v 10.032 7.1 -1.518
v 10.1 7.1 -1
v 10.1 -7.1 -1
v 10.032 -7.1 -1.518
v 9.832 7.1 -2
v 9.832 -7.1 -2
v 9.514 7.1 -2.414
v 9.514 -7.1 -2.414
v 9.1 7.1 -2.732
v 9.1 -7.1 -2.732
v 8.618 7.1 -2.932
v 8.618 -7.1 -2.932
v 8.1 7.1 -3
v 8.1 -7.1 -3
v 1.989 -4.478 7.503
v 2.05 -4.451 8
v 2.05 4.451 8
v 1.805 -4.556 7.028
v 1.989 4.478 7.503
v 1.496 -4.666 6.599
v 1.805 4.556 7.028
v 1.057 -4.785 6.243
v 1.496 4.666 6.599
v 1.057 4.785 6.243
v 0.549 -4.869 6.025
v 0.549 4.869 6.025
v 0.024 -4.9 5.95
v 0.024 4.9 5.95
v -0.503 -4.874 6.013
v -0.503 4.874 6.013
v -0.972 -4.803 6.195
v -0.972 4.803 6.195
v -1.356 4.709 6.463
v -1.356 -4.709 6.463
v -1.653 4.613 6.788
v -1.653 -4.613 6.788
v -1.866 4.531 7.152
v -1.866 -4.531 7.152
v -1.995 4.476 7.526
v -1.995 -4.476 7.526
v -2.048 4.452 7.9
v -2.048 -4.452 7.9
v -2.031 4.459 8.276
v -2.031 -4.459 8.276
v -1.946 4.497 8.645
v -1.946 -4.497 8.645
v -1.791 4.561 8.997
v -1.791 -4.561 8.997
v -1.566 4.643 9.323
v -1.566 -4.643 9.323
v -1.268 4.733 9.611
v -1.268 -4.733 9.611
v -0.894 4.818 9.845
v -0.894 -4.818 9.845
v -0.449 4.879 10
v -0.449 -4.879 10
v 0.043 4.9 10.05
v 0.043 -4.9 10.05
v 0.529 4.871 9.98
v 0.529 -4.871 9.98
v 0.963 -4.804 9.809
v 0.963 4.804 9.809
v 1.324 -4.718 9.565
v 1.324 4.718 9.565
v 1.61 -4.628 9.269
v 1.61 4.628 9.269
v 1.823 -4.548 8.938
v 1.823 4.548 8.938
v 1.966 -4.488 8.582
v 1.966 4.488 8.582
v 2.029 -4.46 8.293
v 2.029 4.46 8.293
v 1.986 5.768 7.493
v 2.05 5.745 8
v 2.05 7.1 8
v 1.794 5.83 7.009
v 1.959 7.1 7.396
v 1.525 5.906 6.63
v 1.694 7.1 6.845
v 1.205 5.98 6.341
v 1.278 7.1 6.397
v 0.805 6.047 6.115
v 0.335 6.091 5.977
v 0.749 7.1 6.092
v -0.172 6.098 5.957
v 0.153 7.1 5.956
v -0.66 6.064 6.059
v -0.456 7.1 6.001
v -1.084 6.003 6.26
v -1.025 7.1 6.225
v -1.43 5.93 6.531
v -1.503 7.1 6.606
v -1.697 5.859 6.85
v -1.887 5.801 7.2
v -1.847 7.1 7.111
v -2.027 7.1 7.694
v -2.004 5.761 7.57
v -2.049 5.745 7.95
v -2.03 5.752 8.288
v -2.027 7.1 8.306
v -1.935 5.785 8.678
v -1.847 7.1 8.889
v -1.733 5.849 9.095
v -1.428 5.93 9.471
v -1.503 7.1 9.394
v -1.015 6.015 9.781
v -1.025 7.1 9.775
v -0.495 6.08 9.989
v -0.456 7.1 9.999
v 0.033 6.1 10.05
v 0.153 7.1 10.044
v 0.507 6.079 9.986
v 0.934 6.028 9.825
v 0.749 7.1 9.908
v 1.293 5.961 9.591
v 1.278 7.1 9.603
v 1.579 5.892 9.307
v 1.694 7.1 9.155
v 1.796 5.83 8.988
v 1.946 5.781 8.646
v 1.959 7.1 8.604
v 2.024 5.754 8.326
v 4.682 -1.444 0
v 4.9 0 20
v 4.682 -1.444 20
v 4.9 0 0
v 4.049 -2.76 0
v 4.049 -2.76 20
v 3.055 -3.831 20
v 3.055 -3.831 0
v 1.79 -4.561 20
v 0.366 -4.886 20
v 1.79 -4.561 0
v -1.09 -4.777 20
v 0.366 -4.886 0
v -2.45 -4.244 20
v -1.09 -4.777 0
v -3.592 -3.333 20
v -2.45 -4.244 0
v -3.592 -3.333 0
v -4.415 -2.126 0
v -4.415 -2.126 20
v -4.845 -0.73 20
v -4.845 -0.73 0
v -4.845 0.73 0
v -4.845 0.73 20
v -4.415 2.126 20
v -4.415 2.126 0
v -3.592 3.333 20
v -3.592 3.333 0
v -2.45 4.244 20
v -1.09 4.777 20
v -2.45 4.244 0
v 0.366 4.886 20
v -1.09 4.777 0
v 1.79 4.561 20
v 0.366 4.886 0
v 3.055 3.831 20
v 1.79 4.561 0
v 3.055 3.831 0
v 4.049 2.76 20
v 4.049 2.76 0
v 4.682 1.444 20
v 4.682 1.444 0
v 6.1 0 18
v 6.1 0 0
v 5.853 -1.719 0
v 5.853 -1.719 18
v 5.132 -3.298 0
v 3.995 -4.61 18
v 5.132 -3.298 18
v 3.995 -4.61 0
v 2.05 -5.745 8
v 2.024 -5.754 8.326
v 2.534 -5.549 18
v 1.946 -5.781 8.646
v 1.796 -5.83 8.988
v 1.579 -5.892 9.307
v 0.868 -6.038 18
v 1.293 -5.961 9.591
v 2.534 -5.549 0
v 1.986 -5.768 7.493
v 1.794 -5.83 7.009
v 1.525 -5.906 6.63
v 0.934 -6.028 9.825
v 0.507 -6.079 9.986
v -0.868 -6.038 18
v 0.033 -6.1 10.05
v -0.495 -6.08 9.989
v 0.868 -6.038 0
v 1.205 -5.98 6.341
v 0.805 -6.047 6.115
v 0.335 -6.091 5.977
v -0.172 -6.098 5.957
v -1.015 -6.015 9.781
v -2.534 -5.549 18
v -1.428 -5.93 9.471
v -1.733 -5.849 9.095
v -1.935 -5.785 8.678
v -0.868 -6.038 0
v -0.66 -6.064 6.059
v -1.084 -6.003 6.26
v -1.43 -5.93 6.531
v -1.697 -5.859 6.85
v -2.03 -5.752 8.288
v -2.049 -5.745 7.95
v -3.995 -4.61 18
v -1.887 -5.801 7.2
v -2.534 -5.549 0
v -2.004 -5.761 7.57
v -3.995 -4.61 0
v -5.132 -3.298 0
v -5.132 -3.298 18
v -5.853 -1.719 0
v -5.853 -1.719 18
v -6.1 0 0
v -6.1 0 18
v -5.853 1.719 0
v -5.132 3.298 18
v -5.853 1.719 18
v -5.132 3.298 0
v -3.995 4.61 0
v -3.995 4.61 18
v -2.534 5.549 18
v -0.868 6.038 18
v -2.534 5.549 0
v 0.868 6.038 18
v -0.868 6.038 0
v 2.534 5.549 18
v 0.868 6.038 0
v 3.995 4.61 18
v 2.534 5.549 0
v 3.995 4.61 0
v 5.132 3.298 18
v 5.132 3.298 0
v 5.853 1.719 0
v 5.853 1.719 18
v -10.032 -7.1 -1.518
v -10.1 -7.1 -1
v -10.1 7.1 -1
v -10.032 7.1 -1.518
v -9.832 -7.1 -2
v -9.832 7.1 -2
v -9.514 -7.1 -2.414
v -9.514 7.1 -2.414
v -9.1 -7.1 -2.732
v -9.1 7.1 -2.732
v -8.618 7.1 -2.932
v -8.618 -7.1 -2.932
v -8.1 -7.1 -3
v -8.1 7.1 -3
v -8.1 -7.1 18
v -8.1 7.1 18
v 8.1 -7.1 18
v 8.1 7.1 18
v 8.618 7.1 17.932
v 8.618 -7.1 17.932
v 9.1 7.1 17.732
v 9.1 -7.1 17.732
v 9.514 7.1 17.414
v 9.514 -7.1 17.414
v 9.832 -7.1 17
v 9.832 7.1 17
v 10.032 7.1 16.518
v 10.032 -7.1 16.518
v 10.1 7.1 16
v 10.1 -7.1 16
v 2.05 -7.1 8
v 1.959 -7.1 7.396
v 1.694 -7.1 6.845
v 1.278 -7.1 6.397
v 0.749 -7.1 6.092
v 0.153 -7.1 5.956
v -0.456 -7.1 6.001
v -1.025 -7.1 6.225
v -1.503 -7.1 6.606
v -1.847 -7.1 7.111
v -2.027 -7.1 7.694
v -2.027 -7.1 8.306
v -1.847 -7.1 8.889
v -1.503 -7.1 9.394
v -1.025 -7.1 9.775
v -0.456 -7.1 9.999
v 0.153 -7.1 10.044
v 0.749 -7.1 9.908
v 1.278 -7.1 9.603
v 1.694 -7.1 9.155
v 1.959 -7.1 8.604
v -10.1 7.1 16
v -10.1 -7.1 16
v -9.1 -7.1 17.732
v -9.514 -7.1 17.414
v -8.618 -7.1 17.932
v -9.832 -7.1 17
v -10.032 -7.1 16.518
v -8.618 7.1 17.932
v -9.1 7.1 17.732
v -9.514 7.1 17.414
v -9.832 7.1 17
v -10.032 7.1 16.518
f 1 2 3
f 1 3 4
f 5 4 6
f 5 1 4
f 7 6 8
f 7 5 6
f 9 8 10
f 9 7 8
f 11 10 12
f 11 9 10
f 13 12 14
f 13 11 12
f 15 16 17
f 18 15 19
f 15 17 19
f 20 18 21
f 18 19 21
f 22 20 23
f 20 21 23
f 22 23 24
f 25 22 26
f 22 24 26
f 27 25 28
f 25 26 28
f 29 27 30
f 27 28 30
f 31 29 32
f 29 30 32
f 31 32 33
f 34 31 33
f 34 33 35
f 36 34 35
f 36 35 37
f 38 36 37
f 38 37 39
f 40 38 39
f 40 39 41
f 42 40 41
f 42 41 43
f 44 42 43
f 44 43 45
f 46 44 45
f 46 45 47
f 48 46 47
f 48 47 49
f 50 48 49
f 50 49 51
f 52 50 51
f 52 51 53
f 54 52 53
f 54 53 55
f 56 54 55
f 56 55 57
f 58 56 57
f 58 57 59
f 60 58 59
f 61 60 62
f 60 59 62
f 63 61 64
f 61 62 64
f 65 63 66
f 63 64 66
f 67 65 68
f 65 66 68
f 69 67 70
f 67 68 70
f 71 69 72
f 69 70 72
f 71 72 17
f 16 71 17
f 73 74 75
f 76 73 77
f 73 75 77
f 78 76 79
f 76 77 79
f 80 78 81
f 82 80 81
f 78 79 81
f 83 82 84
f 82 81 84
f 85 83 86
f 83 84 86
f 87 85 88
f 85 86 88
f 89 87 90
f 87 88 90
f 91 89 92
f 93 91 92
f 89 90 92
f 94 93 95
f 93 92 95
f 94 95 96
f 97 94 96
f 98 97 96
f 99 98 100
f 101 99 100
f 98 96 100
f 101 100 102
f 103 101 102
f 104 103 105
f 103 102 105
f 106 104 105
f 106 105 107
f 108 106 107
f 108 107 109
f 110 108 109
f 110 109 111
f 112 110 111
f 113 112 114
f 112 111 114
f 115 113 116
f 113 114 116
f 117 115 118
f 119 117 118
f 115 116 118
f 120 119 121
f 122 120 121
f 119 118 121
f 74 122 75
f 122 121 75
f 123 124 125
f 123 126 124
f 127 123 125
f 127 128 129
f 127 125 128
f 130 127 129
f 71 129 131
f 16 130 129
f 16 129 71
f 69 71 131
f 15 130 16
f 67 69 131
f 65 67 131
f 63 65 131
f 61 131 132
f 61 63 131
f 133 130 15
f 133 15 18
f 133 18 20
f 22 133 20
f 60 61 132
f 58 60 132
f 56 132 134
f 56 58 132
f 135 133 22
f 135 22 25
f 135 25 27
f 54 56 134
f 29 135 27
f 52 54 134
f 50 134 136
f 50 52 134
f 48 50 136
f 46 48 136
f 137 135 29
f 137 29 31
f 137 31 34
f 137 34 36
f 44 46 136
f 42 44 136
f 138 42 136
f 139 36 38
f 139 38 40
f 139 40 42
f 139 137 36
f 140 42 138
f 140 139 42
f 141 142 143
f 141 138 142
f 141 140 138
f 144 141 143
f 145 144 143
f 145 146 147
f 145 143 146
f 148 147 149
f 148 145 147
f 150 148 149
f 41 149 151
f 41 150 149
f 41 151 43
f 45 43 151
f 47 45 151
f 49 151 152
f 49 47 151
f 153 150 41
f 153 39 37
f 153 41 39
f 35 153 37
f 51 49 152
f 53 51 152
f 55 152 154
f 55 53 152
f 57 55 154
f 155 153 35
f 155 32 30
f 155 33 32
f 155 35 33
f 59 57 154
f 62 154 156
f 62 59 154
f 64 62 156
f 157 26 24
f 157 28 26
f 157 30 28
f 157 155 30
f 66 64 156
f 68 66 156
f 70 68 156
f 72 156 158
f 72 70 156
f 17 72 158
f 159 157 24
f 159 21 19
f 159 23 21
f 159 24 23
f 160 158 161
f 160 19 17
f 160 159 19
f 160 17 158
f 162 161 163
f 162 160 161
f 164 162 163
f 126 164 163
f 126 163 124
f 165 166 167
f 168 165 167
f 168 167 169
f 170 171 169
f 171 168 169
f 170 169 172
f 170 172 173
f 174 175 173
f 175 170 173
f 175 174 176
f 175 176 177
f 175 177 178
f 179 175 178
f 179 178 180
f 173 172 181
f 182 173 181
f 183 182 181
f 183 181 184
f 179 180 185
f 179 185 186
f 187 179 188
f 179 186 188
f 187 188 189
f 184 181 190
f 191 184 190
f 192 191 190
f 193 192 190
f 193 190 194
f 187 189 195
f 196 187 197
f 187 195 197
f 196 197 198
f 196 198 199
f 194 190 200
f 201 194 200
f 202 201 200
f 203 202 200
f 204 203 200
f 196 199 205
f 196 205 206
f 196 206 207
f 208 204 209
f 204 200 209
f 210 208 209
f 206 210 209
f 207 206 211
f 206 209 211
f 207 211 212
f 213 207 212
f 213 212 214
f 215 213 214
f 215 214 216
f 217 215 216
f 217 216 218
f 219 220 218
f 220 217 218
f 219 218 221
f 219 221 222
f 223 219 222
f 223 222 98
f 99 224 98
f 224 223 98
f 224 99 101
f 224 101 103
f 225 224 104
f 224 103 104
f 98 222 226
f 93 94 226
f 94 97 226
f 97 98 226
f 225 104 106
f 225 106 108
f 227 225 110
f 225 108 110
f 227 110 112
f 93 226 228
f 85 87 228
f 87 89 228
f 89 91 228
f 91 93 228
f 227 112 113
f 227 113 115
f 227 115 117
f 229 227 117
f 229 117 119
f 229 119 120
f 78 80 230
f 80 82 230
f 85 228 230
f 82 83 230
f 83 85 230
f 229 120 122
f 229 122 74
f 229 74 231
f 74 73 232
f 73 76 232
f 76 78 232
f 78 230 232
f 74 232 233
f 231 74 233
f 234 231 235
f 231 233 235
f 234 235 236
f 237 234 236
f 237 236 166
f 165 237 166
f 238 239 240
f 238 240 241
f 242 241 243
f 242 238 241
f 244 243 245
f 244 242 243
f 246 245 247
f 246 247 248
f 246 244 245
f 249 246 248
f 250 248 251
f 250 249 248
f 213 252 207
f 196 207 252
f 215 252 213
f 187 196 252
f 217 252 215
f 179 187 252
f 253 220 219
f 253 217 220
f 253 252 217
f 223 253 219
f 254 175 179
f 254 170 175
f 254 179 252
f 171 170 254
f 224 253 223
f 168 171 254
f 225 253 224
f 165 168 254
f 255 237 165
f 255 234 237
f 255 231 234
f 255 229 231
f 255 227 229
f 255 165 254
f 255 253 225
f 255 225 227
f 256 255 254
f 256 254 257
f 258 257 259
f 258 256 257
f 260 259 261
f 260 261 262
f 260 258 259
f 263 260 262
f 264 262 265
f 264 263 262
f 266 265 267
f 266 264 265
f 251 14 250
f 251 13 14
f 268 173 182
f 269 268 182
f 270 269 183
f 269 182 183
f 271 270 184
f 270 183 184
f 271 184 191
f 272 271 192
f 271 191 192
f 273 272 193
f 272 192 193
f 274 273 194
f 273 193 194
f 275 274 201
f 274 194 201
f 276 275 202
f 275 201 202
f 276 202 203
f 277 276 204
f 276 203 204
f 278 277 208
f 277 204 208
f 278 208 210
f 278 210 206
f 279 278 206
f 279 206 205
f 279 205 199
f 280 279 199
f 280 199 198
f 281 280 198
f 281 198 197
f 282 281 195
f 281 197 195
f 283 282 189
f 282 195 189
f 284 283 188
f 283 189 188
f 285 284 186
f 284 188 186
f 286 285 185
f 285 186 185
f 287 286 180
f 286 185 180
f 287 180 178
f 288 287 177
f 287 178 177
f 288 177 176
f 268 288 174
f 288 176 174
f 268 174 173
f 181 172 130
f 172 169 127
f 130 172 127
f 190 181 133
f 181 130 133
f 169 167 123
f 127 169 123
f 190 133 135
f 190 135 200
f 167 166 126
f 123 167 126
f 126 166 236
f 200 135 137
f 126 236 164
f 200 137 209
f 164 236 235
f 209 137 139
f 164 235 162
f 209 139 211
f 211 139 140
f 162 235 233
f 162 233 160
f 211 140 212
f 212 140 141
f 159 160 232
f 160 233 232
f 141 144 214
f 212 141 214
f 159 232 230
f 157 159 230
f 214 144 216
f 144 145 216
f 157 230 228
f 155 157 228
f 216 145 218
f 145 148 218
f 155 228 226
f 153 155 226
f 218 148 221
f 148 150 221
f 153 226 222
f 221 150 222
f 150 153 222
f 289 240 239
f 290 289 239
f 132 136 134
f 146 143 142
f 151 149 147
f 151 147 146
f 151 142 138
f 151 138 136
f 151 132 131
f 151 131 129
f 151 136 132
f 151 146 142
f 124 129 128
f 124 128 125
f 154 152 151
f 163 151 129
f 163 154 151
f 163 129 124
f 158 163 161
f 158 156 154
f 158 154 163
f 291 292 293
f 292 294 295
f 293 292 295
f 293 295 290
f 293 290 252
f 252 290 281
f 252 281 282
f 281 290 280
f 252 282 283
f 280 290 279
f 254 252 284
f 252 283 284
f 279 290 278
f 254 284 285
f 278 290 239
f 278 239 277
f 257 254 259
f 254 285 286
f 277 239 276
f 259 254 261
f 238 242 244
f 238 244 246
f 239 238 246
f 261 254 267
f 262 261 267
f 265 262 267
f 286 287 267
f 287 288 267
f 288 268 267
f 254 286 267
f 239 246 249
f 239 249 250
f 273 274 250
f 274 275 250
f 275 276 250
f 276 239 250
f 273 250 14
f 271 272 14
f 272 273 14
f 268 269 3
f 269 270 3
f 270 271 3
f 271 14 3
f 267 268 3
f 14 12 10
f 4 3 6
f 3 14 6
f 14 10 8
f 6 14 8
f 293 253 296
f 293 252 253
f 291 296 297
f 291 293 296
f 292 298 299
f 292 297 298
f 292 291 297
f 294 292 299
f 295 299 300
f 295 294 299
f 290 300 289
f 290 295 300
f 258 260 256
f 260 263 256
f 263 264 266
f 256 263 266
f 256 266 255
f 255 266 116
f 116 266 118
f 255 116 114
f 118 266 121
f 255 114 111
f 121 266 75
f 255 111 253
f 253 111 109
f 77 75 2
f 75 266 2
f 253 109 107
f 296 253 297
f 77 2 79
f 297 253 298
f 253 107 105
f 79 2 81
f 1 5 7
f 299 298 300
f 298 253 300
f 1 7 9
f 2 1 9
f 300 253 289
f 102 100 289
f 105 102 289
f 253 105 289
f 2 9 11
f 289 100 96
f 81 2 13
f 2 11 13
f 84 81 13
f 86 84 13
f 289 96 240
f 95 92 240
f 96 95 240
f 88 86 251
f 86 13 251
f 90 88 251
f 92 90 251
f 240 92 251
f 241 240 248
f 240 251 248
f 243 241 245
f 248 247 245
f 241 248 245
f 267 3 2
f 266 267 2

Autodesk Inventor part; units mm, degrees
ref_plane "XZ Plane" through (0, 0, 0) normal (0, 1, 0) x (-1, 0, 0)
ref_plane "XY Plane" through (0, 0, 0) normal (0, 0, 1) x (1, 0, 0)
sketch "Sketch1" plane through (0, 0, 0) normal (0, 0, 1) x (1, 0, 0)
  circle A0 centre (0, 0) radius 4.9
  circle A1 centre (0, 0) radius 6.1
  line L0 (-10.1, -7.1) -> (10.1, -7.1)
  line L1 (10.1, -7.1) -> (10.1, 7.1)
  line L2 (10.1, 7.1) -> (-10.1, 7.1)
  line L3 (-10.1, 7.1) -> (-10.1, -7.1)
  line L4 (-10.1, -7.1) -> (10.1, 7.1) construction
  line L5 (10.1, -7.1) -> (-10.1, 7.1) construction
  dimension "d0" = 9.8
  dimension "d1" = 12.2
  dimension "d3" = 4
  dimension "d4" = 1
extrude "Extrusion1" add sketch "Sketch1" along normal blind 18
sketch "Sketch2" plane through (0, 0, 18) normal (0, 0, 1) x (1, 0, 0)
  circle A0 centre (0, 0) radius 4.9 projected
extrude "Extrusion2" add sketch "Sketch2" along normal blind 2
sketch "Sketch3" plane through (0, 0, 0) normal (0, 0, -1) x (-1, 0, 0)
  line L0 (-10.1, -7.1) -> (-10.1, 7.1) projected
  line L1 (10.1, -7.1) -> (-10.1, -7.1) projected
  line L2 (10.1, 7.1) -> (10.1, -7.1) projected
  line L3 (-10.1, 7.1) -> (10.1, 7.1) projected
  circle A0 centre (0, 0) radius 6.1 projected
extrude "Extrusion3" add sketch "Sketch3" along normal blind 3 contours L0 L3 L2 L1 | A0
ref_plane "Work Plane1" through (0, -7.1, 18) normal (-1, 0, 0) x (0, 0, 1)
sketch "Sketch6" plane through (-10.1, 7.1, 18) normal (0, 1, 0) x (1, 0, 0)
  line L0 (5.2, 18) -> (15, 18) projected
  line L1 (16.2, 18) -> (4, 18) projected
  line L2 (20.2, 0) -> (0, 0) projected
  line L3 (0, 21) -> (20.2, 21) projected
  line L4 (16.2, 0) -> (16.2, 18) projected
  line L5 (4, 0) -> (4, 18) projected
  circle A0 centre (10.1, 10) radius 2.05
  line L6 (0, 21) -> (0, 0) projected
  line L7 (20.2, 21) -> (20.2, 0) projected
  point P0 (10.1, 18)
  point P1 (10.1, 18)
  dimension "d49" = 4.1
  dimension "d50" = 10
extrude "Extrusion12" cut sketch "Sketch6" against normal blind 100 contours A0
fillet "Fillet5" radius 2 4 edges at (10.1, 0, 18) (-10.1, 0, 18) (10.1, 0, -3) (-10.1, 0, -3)
sketch "Sketch14" plane through (-8.1, -7.1, -3) normal (0, -1, 0) x (1, 0, 0)
  circle A0 centre (8.1, 11) radius 2.05 projected
  line L0 (8.1, 15.0415) -> (11.6, 13.0207)
  line L1 (11.6, 13.0207) -> (11.6, 8.9793)
  line L2 (11.6, 8.9793) -> (8.1, 6.9585)
  line L3 (8.1, 6.9585) -> (4.6, 8.9793)
  line L4 (4.6, 8.9793) -> (4.6, 13.0207)
  line L5 (4.6, 13.0207) -> (8.1, 15.0415)
  circle A1 centre (8.1, 11) radius 8
  point P0 (8.1, 3)
  dimension "d69" = 7
  dimension "d73" = 16
sketch "Sketch15" plane through (0, -12.1, 8) normal (0, -1, 0) x (1, 0, 0)
  line L0 (3.4, -1) -> (4.8, -1)
  line L1 (4.8, -1) -> (4.8, -7.2415)
  line L2 (4.8, -7.2415) -> (3.4, -7.2415)
  line L3 (3.4, -7.2415) -> (3.4, -1)
  line L4 (3.4, -1) -> (4.8, -7.2415) construction
  line L5 (4.8, -1) -> (3.4, -7.2415) construction
  line L6 (0, 16.6) -> (0, -15.6) projected
  circle A0 centre (0, 0) radius 2.05 projected
  circle A1 centre (0, 0) radius 4.5
  circle A2 centre (0, 0) radius 8 projected
  line L7 (0, 4.0415) -> (3.5, 2.0207) projected
  line L8 (3.5, 2.0207) -> (3.5, -2.0207) projected
  line L9 (3.5, -2.0207) -> (0, -4.0415) projected
  line L10 (0, -4.0415) -> (-3.5, -2.0207) projected
  line L11 (-3.5, -2.0207) -> (-3.5, 2.0207) projected
  line L12 (-3.5, 2.0207) -> (0, 4.0415) projected
  circle A3 centre (0, 0) radius 8 projected
  line L13 (1.4, -7.8765) -> (3.4, -7.8765)
  line L14 (3.4, -7.8765) -> (3.4, -4.8765)
  line L15 (3.4, -4.8765) -> (1.4, -4.8765)
  line L16 (1.4, -4.8765) -> (1.4, -7.8765)
  line L17 (4.8, -6.4) -> (6.8, -6.4)
  line L18 (6.8, -6.4) -> (6.8, -2.4)
  line L19 (6.8, -2.4) -> (4.8, -2.4)
  line L20 (4.8, -2.4) -> (4.8, -6.4)
  line L21 (4.8, 1) -> (3.4, 1)
  line L22 (3.4, 1) -> (3.4, 7.2415)
  line L23 (3.4, 7.2415) -> (4.8, 7.2415)
  line L24 (4.8, 7.2415) -> (4.8, 1)
  line L25 (4.8, 1) -> (3.4, 7.2415) construction
  line L26 (3.4, 1) -> (4.8, 7.2415) construction
  line L27 (4.8, 6.4) -> (6.8, 6.4)
  line L28 (6.8, 6.4) -> (6.8, 3.4)
  line L29 (6.8, 3.4) -> (4.8, 3.4)
  line L30 (4.8, 3.4) -> (4.8, 6.4)
  line L31 (1.4, 8.7415) -> (3.4, 8.7415)
  line L32 (3.4, 8.7415) -> (3.4, 5.7415)
  line L33 (3.4, 5.7415) -> (1.4, 5.7415)
  line L34 (1.4, 5.7415) -> (1.4, 8.7415)
  point P0 (0, -8)
  point P1 (4.1, -4.1208)
  point P2 (2.05, 0)
  point P3 (4.8, -6.4)
  point P4 (6.8, -4.2143)
  point P5 (4.1, 4.1208)
  point P6 (4.8, 3.4)
  point P7 (6.8, 4.2143)
  point P8 (4.8, 6.4)
  point P9 (1.4, 7.8765)
  point P10 (4.8, 6.4)
  dimension "d74" = 4.1
  dimension "d75" = 1.4
  dimension "d76" = 9
  dimension "d77" = 1
  dimension "d78" = 2
  dimension "d79" = 3
  dimension "d80" = 2
  dimension "d81" = 4
  dimension "d84" = 1.4
  dimension "d85" = 1
  dimension "d86" = 4.1
  dimension "d87" = 2
  dimension "d88" = 3
  dimension "d89" = 2
  dimension "d90" = 3
  dimension "d97" = 1.5
sketch "Sketch16" plane through (-3.5, -7.1, 5.9793) normal (0, -1, 0) x (1, 0, 0)
  line L0 (3.5, 6.0622) -> (0, 4.0415) projected
  line L1 (0, 4.0415) -> (0, 0) projected
  line L2 (0, 0) -> (3.5, -2.0207) projected
  line L3 (3.5, -2.0207) -> (7, 0) projected
  line L4 (7, 0) -> (7, 4.0415) projected
  line L5 (7, 4.0415) -> (3.5, 6.0622) projected
  circle A0 centre (3.5, 2.0207) radius 2.05 projected
  point P0 (3.5, -5.9793)
sketch "Sketch17" plane through (-8.1, -12.1, -3) normal (0, -1, 0) x (1, 0, 0)
  arc A0 (12.9, 17.4) -> (11.5, 18.2415) centre (8.1, 11) ccw projected
  circle A1 centre (8.1, 11) radius 25
  circle A2 centre (8.1, 11) radius 8
  point P0 (8.1, 3)
  point P1 (9.5, 18.8765)
  point P2 (9.5, 18.8765)
  point P3 (14.9, 15.2143)
  dimension "d94" = 17
sketch "Sketch18" plane through (-8.1, -7.1, -3) normal (0, -1, 0) x (1, 0, 0)
  circle A0 centre (8.1, 11) radius 25 projected
  arc A1 (-2, 2) -> (0, 0) centre (0, 2) ccw projected
  line L0 (16.2, 0) -> (0, 0) projected
  arc A2 (16.2, 0) -> (18.2, 2) centre (16.2, 2) ccw projected
  line L1 (18.2, 19) -> (18.2, 2) projected
  arc A3 (18.2, 19) -> (16.2, 21) centre (16.2, 19) ccw projected
  line L2 (0, 21) -> (16.2, 21) projected
  arc A4 (0, 21) -> (-2, 19) centre (0, 19) ccw projected
  line L3 (-2, 2) -> (-2, 19) projected
  circle A5 centre (8.1, 11) radius 8 projected
  point P0 (8.1, 3)
sketch "Sketch20" plane through (0, -12.1, 8) normal (0, -1, 0) x (1, 0, 0)
  circle A0 centre (0, 0) radius 25 projected
  circle A1 centre (0, 0) radius 22
  point P0 (0, -8)
  dimension "d104" = 3
sketch "Sketch21" plane through (-8.1, -5.1, -3) normal (0, 1, 0) x (1, 0, 0)
  arc A0 (11.4466, -35.775) -> (4.7534, -35.775) centre (8.1, -11) ccw projected
  arc A1 (11.3011, -32.7659) -> (4.8989, -32.7659) centre (8.1, -11) ccw
  circle A2 centre (8.1, -11) radius 2.05 projected
  circle A3 centre (8.1, -11) radius 22
  circle A4 centre (8.1, -11) radius 22 projected
  line L0 (0.1, -31.4939) -> (0.1, -34.6854)
  line L1 (16.1, -31.4939) -> (16.1, -34.6854)
  point P0 (8.1, -3)
  point P1 (11.4466, -33.7552)
  point P2 (4.7534, -33.7552)
  point P3 (16.1, -31.4939)
  point P4 (18.1, -31.7123)
  point P5 (-1.9, -31.7123)
  dimension "d107" = 3
  dimension "d108" = 8
  dimension "d109" = 8
  dimension "d124" = 37
  dimension "d125" = 19
  dimension "d126" = 1.5
  dimension "d127" = 1.5
  dimension "d130" = 360
properties part number "Primary_hinge_V2"
